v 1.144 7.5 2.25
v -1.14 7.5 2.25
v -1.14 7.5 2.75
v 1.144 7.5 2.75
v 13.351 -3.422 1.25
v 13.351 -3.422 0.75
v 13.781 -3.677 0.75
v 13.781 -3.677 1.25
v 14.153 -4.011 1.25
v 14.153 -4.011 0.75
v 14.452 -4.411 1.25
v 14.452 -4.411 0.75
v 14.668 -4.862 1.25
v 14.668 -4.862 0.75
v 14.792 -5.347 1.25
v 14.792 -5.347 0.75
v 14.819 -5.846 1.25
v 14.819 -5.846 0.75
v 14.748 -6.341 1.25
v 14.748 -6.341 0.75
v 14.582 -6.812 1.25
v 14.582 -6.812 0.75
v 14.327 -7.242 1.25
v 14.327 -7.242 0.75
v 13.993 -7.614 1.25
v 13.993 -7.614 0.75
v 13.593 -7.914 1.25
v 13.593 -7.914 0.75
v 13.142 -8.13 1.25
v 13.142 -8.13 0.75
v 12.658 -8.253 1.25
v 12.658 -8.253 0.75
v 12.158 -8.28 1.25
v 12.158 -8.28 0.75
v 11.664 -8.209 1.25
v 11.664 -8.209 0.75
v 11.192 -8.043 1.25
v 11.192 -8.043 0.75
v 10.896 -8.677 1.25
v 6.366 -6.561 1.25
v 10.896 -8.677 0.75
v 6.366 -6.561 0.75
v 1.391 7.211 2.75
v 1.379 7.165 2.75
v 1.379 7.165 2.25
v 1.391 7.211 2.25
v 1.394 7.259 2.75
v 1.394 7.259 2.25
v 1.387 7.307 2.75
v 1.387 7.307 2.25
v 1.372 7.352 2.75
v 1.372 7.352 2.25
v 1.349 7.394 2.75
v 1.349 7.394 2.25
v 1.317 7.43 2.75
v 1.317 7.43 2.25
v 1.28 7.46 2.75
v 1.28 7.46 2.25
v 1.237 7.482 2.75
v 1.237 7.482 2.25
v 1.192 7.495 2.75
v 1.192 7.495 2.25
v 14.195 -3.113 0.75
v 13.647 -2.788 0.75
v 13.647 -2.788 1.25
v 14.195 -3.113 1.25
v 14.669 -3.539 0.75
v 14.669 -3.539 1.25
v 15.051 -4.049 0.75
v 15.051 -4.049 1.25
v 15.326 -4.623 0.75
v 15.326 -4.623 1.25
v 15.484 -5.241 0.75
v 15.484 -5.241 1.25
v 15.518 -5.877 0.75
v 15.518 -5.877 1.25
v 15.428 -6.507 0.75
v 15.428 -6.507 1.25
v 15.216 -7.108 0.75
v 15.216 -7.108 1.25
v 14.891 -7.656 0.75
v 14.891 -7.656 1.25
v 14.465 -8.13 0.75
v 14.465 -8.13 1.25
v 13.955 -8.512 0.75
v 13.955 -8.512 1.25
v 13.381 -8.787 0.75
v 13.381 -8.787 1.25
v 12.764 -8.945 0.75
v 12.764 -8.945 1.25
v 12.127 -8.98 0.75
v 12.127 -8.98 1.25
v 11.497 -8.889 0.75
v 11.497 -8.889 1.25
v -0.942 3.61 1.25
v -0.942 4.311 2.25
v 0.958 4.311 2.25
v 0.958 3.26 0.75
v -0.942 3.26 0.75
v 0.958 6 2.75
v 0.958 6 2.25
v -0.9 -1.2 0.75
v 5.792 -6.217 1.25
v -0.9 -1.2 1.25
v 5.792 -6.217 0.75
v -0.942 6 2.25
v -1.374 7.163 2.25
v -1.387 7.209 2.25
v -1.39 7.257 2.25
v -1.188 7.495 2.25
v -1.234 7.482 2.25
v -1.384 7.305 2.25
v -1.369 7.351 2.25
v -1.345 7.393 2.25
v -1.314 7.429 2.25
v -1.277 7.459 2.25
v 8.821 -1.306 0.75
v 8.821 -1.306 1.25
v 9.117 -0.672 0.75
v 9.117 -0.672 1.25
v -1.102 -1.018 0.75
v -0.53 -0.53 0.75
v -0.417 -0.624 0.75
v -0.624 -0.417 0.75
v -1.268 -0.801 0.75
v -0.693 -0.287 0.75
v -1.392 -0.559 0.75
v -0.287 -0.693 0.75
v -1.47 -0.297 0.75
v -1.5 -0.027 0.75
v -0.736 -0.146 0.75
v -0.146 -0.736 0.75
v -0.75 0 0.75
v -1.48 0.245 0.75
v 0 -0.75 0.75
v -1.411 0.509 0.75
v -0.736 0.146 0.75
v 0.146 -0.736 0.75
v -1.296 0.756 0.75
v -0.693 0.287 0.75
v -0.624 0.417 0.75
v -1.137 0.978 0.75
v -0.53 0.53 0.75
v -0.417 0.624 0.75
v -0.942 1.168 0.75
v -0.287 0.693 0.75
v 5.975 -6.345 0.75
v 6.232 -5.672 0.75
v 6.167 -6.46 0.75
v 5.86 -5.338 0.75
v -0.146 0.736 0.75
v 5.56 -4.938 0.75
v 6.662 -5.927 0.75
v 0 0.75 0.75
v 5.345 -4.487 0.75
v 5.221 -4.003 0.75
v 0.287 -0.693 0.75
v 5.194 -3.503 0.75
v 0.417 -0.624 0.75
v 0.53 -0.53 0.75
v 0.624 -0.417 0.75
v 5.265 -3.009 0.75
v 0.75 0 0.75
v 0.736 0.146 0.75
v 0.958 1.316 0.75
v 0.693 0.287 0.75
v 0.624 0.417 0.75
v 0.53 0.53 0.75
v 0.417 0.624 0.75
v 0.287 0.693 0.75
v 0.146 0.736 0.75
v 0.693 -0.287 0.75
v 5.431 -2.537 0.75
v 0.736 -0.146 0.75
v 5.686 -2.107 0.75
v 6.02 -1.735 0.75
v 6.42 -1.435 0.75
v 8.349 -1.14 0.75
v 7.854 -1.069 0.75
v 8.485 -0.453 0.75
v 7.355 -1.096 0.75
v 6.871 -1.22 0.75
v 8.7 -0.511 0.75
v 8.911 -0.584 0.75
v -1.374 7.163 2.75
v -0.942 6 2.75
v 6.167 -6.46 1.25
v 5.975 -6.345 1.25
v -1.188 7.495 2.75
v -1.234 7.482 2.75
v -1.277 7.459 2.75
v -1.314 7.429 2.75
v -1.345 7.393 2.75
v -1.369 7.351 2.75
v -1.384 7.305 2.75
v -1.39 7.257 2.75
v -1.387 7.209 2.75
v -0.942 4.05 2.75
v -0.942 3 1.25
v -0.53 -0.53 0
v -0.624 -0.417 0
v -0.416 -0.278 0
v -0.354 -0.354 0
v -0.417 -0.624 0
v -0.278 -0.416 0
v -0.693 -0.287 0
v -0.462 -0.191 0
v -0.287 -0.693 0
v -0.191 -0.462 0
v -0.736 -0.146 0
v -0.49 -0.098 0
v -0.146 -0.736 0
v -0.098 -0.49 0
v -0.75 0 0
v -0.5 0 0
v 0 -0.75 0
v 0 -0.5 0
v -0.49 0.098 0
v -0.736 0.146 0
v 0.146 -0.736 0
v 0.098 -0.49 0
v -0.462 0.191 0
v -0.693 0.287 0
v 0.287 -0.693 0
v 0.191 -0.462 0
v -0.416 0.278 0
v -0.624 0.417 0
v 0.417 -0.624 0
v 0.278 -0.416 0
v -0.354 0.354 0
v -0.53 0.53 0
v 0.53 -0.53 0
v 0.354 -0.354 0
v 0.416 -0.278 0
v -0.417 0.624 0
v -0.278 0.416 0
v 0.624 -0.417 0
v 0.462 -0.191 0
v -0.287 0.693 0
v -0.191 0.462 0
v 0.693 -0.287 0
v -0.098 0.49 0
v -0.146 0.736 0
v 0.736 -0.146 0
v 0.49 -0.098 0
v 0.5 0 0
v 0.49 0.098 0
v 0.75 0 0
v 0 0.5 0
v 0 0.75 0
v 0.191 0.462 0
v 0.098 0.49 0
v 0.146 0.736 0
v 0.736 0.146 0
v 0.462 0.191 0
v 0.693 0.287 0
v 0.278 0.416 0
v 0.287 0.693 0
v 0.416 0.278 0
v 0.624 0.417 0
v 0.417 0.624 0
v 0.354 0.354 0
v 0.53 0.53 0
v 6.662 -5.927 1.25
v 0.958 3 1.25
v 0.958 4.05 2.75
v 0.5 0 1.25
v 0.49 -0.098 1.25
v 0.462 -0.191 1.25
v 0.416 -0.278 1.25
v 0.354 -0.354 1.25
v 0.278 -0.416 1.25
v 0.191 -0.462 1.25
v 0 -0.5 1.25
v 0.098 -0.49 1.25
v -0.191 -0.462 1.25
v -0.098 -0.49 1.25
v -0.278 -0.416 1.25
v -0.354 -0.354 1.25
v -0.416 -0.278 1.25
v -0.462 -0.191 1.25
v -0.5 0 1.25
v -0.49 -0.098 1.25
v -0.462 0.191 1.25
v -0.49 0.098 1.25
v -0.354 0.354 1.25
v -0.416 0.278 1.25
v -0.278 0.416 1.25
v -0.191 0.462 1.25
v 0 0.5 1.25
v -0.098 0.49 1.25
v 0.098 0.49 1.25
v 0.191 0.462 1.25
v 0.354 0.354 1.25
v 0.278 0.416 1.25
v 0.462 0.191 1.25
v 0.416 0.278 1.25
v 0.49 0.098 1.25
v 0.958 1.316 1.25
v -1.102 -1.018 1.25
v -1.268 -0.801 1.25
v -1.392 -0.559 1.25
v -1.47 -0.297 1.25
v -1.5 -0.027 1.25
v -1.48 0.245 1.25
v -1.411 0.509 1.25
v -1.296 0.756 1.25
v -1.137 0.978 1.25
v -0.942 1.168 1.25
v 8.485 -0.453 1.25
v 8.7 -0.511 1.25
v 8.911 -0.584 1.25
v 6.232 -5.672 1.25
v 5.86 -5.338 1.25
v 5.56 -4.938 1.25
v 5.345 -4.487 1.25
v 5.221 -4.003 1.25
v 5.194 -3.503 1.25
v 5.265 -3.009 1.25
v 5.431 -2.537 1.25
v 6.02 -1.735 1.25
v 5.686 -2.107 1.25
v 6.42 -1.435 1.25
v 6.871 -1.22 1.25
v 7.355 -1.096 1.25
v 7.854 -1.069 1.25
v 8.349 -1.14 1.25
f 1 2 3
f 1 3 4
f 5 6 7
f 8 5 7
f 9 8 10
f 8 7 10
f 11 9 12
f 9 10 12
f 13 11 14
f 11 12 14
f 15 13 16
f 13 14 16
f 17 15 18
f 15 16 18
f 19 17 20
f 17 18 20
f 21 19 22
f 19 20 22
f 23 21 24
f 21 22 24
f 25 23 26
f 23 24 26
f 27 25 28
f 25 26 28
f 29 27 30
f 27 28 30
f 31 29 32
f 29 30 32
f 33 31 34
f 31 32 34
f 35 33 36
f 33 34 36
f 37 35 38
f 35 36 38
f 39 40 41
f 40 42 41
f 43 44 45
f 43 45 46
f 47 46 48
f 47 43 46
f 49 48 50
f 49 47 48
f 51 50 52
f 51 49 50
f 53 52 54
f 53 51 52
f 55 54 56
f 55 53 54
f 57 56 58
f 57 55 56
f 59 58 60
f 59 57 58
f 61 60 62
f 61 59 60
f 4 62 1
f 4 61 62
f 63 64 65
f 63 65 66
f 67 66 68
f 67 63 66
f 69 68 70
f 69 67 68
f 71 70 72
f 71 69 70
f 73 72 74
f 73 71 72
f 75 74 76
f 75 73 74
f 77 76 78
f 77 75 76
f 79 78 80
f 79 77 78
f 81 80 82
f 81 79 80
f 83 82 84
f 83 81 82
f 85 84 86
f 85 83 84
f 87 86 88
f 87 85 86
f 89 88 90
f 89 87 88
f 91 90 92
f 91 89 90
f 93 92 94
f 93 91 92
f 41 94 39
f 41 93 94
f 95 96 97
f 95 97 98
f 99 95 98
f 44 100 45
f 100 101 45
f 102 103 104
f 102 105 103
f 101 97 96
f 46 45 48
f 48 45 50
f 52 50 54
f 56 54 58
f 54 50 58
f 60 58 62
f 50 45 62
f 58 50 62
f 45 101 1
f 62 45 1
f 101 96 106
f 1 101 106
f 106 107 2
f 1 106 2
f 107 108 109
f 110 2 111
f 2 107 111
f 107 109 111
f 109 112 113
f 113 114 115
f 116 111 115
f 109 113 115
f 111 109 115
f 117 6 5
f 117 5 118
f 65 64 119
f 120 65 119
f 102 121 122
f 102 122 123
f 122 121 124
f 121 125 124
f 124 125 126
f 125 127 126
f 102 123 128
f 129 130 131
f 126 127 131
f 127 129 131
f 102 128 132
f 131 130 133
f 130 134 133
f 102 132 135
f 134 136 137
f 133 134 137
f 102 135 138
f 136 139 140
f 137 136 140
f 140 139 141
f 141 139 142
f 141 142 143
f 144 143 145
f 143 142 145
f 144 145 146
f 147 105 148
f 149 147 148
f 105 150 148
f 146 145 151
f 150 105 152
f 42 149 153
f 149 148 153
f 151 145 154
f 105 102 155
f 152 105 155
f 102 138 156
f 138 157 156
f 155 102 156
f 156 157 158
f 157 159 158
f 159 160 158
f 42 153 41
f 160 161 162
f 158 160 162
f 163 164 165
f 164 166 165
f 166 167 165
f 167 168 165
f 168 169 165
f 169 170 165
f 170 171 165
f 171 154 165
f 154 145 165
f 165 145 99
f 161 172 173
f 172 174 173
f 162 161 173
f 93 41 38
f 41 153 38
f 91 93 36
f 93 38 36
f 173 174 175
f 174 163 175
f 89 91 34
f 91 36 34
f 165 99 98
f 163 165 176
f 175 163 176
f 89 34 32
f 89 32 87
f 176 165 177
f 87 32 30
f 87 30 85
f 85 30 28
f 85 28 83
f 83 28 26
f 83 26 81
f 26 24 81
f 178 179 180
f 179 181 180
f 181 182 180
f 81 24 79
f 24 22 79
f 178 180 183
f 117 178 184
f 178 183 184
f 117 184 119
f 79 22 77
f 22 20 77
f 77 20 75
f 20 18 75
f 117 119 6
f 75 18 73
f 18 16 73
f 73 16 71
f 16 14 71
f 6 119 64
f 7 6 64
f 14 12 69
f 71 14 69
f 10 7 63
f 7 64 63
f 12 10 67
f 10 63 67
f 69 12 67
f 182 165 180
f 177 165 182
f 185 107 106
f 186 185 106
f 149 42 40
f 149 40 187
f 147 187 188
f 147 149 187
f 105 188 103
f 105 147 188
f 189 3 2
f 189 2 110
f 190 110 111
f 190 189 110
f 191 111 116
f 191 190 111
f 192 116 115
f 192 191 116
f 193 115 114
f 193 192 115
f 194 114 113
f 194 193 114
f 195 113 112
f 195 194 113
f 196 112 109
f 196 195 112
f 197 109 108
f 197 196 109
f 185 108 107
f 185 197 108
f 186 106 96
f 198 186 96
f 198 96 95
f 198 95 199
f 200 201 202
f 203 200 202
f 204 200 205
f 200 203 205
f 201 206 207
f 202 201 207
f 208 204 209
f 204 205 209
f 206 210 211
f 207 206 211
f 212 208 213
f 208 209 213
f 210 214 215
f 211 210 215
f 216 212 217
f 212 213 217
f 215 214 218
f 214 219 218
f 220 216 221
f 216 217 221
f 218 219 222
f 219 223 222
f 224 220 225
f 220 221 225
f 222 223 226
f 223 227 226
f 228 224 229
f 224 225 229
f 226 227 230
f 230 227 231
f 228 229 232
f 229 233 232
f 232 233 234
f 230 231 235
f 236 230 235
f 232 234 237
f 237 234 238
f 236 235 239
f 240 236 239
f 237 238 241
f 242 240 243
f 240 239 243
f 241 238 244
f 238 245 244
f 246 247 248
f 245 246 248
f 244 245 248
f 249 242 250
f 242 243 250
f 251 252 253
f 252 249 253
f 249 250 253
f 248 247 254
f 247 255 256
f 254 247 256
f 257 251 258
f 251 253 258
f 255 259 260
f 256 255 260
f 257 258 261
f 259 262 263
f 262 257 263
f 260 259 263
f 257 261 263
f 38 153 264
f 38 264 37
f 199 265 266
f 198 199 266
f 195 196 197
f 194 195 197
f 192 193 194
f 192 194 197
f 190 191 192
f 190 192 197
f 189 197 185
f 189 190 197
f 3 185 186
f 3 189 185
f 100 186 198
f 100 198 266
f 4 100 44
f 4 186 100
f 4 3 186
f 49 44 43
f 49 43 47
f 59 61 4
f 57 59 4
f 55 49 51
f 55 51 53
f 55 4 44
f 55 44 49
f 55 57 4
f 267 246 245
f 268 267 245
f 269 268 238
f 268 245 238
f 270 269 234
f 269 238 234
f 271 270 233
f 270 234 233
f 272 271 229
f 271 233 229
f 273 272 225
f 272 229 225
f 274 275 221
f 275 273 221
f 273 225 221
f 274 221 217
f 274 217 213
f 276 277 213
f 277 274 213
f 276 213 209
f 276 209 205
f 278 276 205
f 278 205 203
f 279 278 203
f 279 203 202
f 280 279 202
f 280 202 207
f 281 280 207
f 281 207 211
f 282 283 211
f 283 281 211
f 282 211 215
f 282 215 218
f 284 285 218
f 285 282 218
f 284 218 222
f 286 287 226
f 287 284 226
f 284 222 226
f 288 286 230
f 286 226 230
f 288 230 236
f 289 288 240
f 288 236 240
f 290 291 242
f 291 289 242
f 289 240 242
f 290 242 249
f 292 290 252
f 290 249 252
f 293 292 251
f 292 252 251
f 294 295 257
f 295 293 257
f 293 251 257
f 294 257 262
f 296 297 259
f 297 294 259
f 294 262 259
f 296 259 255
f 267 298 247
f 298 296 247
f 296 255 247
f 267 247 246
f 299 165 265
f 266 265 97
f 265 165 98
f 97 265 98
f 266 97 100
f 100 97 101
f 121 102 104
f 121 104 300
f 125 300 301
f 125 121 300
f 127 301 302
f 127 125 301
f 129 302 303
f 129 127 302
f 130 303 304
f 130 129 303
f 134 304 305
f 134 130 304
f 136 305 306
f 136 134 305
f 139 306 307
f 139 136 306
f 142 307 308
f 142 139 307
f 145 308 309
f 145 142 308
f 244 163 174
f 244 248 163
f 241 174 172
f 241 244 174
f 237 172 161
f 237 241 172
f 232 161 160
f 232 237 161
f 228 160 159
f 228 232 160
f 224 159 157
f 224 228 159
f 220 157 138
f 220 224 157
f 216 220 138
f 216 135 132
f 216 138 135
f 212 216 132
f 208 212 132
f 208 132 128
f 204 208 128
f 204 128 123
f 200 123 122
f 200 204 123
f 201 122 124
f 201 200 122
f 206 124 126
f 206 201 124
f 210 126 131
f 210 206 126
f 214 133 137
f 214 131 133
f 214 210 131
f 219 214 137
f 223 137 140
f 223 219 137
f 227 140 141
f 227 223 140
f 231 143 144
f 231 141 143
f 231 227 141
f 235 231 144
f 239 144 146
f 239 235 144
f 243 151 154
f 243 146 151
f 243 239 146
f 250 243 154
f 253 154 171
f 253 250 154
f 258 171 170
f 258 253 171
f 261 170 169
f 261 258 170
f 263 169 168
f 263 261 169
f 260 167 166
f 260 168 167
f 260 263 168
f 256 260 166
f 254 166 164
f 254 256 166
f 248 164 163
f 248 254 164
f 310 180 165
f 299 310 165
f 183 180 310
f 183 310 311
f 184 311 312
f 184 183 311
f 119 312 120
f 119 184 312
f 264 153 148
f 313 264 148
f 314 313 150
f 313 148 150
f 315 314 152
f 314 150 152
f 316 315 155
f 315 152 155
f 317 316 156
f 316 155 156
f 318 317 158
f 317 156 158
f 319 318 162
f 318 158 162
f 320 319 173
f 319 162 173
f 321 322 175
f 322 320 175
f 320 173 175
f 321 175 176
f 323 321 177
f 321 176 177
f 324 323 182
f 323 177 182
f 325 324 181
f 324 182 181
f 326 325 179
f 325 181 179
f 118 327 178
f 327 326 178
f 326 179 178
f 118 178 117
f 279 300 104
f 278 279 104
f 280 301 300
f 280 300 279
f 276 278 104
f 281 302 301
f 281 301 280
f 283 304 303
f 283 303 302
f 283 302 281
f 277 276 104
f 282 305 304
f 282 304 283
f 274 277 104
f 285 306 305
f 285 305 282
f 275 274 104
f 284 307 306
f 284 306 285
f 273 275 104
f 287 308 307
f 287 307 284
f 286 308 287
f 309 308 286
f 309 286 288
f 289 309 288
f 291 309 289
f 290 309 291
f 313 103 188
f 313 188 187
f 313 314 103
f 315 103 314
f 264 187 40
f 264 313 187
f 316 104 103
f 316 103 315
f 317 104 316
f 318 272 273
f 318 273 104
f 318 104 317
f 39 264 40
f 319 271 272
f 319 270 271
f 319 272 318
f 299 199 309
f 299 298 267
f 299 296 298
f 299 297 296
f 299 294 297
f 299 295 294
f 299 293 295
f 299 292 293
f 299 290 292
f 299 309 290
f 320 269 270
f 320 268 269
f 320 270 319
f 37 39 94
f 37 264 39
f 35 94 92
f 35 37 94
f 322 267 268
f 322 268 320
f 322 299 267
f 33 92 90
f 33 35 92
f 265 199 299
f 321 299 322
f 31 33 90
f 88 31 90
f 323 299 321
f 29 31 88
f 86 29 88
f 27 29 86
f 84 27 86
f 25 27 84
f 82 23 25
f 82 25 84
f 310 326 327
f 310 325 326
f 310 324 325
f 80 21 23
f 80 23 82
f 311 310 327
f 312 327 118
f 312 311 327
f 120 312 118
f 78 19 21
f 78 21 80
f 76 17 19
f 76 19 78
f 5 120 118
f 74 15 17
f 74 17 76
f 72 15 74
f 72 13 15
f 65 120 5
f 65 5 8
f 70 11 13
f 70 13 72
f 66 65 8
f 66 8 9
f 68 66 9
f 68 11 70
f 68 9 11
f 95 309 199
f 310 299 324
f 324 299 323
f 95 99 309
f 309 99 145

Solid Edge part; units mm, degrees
sketch "Sketch1" plane through (0, 0, 0) normal (0, 0, 1) x (1, 0, 0)
  circle A0 centre (0, 0) radius 0.5
  circle A1 centre (0, 0) radius 0.75
extrude "Protrusion1" add sketch "Sketch1" along normal up to vertex (0.75 mm away)
sketch "Sketch2" plane through (0, 0, 0.75) normal (0, 0, 1) x (1, 0, 0)
  arc A0 (8.8206, -1.3061) -> (6.6621, -5.9268) centre (7.7413, -3.6164) ccw
  line L0 (6.6621, -5.9268) -> (11.1921, -8.043)
  arc A1 (11.1921, -8.043) -> (13.3507, -3.4223) centre (12.2714, -5.7327) ccw
  line L1 (13.3507, -3.4223) -> (8.8206, -1.3061)
  circle A2 centre (0, 0) radius 0.5
  line L2 (13.647, -2.7881) -> (9.1169, -0.6719)
  arc A3 (9.1169, -0.6719) -> (8.4847, -0.4526) centre (7.7413, -3.6164) ccw
  line L3 (8.4847, -0.4526) -> (0.9584, 1.3157)
  line L4 (0.9584, 1.3157) -> (0.9584, 6)
  line L5 (0.9584, 6) -> (1.5, 7.5)
  line L6 (-1.5, 7.5) -> (1.5, 7.5)
  line L7 (-1.5, 7.5) -> (-0.9416, 6)
  line L8 (-0.9416, 6) -> (-0.9416, 1.1676)
  line L9 (5.7919, -6.2168) -> (-0.8998, -1.2002)
  line L10 (6.3658, -6.561) -> (10.8958, -8.6772)
  arc A4 (10.8958, -8.6772) -> (13.647, -2.7881) centre (12.2714, -5.7327) ccw
  arc A5 (5.7919, -6.2168) -> (6.3658, -6.561) centre (7.7413, -3.6164) ccw
  arc A6 (-0.9416, 1.1676) -> (-0.8998, -1.2002) centre (0, 0) ccw
  dimension "D1" = 6.3658
  dimension "D2" = 1.5
extrude "Protrusion2" add sketch "Sketch2" along normal blind 0.5
sketch "Sketch3" plane through (0, 0, 1.25) normal (0, 0, 1) x (1, 0, 0)
  line L0 (1.5, 7.5) -> (-1.5, 7.5)
  line L1 (-1.5, 7.5) -> (-0.9416, 6)
  line L2 (-0.9416, 6) -> (-0.9416, 3)
  line L3 (-0.9416, 3) -> (0.9584, 3)
  line L4 (0.9584, 3) -> (0.9584, 6)
  line L5 (0.9584, 6) -> (1.5, 7.5)
  dimension "D1" = 3
extrude "ExtrudedProtrusion_3" add sketch "Sketch3" along normal blind 1.5
sketch "Sketch4" plane through (0.9584, 5.4372, 2.375) normal (1, 0, 0) x (0, 1, 0)
  line L0 (-2.4372, -1.125) -> (-1.3869, 0.375)
  line L1 (-2.4372, 1.625) -> (-2.4372, -1.125)
extrude "Cutout1" cut sketch "Sketch4" against normal through all material side at (0.9584, 3.4842, 2.0287)
sketch "Sketch5" plane through (0.9584, 5.4372, 2.375) normal (1, 0, 0) x (0, 1, 0)
  line L0 (-2.0276, -1.4118) -> (-1.1266, -0.125)
  line L1 (-1.1266, -0.125) -> (-0.4372, -0.125)
extrude "Cutout2" cut sketch "Sketch5" along normal through all and the other way through all material side at (0.9584, 3.9011, 1.5779)
fillet "Round_1" radius 0.25 2 edges at (1.5, 7.5, 2.5) (-1.5, 7.5, 2.5)
properties material "Polypropylene, high impact"
